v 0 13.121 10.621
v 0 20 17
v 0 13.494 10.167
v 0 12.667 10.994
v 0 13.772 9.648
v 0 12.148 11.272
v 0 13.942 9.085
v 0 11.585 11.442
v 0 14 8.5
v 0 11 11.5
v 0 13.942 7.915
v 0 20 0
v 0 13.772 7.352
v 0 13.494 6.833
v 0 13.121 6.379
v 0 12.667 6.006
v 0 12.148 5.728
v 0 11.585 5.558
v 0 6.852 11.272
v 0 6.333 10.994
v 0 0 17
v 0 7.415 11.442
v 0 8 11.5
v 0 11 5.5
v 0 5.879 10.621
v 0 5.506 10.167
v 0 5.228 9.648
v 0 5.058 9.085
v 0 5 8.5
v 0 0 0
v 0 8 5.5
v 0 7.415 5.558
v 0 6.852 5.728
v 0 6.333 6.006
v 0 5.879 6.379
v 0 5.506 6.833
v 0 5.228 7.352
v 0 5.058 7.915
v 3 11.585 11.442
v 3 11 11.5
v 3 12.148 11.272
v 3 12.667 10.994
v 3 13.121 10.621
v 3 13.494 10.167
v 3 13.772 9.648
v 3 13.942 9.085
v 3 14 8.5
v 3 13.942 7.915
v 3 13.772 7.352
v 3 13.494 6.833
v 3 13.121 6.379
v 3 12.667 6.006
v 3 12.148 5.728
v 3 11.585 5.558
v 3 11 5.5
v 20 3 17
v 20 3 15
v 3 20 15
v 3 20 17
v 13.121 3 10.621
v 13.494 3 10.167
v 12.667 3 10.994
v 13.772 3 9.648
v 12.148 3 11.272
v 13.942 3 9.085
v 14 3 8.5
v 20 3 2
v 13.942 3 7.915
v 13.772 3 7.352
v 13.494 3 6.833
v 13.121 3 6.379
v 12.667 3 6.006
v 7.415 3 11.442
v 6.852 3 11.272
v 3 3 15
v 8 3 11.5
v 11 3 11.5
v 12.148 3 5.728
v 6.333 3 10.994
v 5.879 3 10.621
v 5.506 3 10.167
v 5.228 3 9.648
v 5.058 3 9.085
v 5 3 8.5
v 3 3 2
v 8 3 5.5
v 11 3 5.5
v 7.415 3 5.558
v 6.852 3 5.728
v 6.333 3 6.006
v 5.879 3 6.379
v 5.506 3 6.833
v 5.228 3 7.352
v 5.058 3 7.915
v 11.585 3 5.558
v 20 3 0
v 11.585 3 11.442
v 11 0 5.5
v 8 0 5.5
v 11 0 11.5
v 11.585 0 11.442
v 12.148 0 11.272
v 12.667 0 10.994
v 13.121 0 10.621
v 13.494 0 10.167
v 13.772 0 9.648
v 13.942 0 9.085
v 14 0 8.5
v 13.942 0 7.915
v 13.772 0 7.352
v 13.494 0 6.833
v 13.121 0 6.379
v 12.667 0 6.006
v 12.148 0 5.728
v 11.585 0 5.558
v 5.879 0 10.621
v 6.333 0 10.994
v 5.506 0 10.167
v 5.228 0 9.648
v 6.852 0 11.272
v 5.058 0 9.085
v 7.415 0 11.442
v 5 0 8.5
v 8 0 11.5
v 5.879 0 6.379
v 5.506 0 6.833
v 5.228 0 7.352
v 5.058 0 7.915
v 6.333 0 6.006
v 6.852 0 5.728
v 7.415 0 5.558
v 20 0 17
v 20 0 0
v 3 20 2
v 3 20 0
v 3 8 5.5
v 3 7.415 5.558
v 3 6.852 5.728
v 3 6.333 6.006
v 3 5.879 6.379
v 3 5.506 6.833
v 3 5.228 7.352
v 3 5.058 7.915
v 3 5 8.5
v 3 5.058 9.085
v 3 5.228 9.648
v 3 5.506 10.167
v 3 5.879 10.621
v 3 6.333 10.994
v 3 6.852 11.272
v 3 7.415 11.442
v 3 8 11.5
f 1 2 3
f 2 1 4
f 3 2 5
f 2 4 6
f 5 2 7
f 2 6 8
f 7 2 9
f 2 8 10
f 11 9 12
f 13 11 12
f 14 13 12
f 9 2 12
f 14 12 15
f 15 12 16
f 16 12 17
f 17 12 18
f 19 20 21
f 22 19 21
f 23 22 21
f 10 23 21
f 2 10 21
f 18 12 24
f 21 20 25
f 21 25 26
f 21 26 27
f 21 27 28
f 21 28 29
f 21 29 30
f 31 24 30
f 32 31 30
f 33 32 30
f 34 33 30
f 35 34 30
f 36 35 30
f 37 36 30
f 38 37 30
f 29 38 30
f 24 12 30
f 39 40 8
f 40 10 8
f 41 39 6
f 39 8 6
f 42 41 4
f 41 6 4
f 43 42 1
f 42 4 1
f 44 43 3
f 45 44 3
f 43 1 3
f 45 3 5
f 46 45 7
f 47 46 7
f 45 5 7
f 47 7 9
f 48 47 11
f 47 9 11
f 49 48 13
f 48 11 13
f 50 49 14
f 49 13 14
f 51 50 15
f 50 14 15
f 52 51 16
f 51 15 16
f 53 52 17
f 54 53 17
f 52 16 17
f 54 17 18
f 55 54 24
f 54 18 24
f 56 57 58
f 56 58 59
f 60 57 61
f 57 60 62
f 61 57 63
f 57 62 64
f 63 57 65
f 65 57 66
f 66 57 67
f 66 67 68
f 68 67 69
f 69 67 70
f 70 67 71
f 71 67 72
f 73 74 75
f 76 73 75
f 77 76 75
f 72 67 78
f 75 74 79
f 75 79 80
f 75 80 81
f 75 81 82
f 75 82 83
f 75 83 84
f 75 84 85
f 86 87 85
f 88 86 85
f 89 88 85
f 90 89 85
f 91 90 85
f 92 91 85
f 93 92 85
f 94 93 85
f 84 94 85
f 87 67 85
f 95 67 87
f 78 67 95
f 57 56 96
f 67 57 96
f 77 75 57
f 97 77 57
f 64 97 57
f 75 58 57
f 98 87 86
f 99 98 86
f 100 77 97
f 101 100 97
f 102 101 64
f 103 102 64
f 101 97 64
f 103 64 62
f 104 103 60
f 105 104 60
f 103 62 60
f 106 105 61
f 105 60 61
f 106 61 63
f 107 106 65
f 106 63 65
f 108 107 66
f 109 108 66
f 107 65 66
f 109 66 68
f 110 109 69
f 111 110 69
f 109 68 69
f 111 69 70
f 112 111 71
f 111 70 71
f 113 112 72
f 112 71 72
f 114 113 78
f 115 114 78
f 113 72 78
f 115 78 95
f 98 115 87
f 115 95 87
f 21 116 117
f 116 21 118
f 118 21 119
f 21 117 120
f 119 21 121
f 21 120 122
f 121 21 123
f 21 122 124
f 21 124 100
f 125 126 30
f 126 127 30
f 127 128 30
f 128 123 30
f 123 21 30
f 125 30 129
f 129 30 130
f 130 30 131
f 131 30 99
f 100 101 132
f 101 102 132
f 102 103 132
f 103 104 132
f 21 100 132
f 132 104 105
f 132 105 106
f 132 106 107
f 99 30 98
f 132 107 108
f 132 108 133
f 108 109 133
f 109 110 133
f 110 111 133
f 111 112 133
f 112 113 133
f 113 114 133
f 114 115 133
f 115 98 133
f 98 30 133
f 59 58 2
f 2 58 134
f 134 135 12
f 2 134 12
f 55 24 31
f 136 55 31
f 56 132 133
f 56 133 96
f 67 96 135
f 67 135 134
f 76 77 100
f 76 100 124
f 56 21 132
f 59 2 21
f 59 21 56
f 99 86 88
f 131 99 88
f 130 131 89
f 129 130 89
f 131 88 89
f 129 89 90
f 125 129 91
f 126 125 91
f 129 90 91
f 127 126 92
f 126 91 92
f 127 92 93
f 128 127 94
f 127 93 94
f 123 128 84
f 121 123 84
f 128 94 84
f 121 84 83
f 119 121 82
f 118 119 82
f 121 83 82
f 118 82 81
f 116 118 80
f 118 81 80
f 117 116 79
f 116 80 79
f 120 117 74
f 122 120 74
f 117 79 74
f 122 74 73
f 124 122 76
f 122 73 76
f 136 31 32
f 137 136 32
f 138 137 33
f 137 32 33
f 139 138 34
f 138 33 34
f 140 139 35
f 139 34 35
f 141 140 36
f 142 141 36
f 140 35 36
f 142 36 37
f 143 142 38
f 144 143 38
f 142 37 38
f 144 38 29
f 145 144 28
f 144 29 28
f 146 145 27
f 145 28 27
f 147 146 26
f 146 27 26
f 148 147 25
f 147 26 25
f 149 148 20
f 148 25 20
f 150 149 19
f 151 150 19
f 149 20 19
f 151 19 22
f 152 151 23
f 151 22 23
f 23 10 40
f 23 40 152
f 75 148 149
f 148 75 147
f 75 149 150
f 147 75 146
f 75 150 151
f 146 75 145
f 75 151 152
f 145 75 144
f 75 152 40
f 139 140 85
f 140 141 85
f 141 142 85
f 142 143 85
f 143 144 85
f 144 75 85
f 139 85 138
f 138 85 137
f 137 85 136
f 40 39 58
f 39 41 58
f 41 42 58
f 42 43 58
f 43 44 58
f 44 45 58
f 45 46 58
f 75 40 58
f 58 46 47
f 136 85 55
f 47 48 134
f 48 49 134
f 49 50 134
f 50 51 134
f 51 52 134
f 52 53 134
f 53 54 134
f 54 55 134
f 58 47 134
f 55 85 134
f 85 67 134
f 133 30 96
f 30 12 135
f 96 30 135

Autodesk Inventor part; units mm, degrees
ref_plane "YZ Plane" through (0, 0, 0) normal (1, 0, 0) x (0, 1, 0)
ref_plane "XZ Plane" through (0, 0, 0) normal (0, 1, 0) x (-1, 0, 0)
sketch "Sketch2" plane through (0, 0, 0) normal (0, 0, 1) x (1, 0, 0)
  line L0 (3, 20) -> (0, 20)
  line L1 (0, 20) -> (0, 0)
  line L2 (0, 0) -> (20, 0)
  line L3 (20, 0) -> (20, 3)
  line L4 (20, 3) -> (3, 3)
  line L5 (3, 3) -> (3, 20)
  dimension "d0" = 20
  dimension "d1" = 3
extrude "Extrusion1" add sketch "Sketch2" along normal blind 17
ref_plane "Work Plane1" through (3, 20, 0) normal (0.7071, 0.7071, 0) x (0, 0, 1)
sketch "Sketch3" plane through (3, 20, 0) normal (0.7071, 0.7071, 0) x (0, 0, 1)
  line L0 (0, 24.0416) -> (17, 24.0416) projected
  line L1 (17, 0) -> (15, 0)
  line L2 (15, 0) -> (15, 24.0416)
  line L3 (15, 24.0416) -> (17, 24.0416)
  line L4 (17, 24.0416) -> (17, 0)
  line L5 (0, 24.0416) -> (2, 24.0416)
  line L6 (2, 24.0416) -> (2, 0)
  line L7 (2, 0) -> (0, 0)
  line L8 (0, 0) -> (0, 24.0416)
  point P0 (0, 12.0208)
  dimension "d4" = 2
  dimension "d5" = 2
extrude "Extrusion2" add sketch "Sketch3" against normal up to next
sketch "Sketch4" plane through (3, 3, 2) normal (0, 1, 0) x (1, 0, 0)
  arc A0 (5, -3.5) -> (5, -9.5) centre (5, -6.5) ccw
  arc A1 (8, -9.5) -> (8, -3.5) centre (8, -6.5) ccw
  line L0 (8, -3.5) -> (5, -3.5)
  line L1 (8, -9.5) -> (5, -9.5)
  line L2 (-3, 2) -> (-3, -15) projected
  point P0 (-3, -6.5)
  point P1 (-3, -6.5)
  dimension "d8" = 6
  dimension "d9" = 6
  dimension "d10" = 3
  dimension "d11" = 8
extrude "Extrusion3" cut sketch "Sketch4" against normal blind 6
pattern_circular "Circular Pattern2" count 2 over 90 about axis through (0, 0, 0) along (0, 0, 1) of "Extrusion3"
equation "\"d5\" = d4"
equation "\"d9\" = d8"
properties part number "20x20 90 Gusset"
